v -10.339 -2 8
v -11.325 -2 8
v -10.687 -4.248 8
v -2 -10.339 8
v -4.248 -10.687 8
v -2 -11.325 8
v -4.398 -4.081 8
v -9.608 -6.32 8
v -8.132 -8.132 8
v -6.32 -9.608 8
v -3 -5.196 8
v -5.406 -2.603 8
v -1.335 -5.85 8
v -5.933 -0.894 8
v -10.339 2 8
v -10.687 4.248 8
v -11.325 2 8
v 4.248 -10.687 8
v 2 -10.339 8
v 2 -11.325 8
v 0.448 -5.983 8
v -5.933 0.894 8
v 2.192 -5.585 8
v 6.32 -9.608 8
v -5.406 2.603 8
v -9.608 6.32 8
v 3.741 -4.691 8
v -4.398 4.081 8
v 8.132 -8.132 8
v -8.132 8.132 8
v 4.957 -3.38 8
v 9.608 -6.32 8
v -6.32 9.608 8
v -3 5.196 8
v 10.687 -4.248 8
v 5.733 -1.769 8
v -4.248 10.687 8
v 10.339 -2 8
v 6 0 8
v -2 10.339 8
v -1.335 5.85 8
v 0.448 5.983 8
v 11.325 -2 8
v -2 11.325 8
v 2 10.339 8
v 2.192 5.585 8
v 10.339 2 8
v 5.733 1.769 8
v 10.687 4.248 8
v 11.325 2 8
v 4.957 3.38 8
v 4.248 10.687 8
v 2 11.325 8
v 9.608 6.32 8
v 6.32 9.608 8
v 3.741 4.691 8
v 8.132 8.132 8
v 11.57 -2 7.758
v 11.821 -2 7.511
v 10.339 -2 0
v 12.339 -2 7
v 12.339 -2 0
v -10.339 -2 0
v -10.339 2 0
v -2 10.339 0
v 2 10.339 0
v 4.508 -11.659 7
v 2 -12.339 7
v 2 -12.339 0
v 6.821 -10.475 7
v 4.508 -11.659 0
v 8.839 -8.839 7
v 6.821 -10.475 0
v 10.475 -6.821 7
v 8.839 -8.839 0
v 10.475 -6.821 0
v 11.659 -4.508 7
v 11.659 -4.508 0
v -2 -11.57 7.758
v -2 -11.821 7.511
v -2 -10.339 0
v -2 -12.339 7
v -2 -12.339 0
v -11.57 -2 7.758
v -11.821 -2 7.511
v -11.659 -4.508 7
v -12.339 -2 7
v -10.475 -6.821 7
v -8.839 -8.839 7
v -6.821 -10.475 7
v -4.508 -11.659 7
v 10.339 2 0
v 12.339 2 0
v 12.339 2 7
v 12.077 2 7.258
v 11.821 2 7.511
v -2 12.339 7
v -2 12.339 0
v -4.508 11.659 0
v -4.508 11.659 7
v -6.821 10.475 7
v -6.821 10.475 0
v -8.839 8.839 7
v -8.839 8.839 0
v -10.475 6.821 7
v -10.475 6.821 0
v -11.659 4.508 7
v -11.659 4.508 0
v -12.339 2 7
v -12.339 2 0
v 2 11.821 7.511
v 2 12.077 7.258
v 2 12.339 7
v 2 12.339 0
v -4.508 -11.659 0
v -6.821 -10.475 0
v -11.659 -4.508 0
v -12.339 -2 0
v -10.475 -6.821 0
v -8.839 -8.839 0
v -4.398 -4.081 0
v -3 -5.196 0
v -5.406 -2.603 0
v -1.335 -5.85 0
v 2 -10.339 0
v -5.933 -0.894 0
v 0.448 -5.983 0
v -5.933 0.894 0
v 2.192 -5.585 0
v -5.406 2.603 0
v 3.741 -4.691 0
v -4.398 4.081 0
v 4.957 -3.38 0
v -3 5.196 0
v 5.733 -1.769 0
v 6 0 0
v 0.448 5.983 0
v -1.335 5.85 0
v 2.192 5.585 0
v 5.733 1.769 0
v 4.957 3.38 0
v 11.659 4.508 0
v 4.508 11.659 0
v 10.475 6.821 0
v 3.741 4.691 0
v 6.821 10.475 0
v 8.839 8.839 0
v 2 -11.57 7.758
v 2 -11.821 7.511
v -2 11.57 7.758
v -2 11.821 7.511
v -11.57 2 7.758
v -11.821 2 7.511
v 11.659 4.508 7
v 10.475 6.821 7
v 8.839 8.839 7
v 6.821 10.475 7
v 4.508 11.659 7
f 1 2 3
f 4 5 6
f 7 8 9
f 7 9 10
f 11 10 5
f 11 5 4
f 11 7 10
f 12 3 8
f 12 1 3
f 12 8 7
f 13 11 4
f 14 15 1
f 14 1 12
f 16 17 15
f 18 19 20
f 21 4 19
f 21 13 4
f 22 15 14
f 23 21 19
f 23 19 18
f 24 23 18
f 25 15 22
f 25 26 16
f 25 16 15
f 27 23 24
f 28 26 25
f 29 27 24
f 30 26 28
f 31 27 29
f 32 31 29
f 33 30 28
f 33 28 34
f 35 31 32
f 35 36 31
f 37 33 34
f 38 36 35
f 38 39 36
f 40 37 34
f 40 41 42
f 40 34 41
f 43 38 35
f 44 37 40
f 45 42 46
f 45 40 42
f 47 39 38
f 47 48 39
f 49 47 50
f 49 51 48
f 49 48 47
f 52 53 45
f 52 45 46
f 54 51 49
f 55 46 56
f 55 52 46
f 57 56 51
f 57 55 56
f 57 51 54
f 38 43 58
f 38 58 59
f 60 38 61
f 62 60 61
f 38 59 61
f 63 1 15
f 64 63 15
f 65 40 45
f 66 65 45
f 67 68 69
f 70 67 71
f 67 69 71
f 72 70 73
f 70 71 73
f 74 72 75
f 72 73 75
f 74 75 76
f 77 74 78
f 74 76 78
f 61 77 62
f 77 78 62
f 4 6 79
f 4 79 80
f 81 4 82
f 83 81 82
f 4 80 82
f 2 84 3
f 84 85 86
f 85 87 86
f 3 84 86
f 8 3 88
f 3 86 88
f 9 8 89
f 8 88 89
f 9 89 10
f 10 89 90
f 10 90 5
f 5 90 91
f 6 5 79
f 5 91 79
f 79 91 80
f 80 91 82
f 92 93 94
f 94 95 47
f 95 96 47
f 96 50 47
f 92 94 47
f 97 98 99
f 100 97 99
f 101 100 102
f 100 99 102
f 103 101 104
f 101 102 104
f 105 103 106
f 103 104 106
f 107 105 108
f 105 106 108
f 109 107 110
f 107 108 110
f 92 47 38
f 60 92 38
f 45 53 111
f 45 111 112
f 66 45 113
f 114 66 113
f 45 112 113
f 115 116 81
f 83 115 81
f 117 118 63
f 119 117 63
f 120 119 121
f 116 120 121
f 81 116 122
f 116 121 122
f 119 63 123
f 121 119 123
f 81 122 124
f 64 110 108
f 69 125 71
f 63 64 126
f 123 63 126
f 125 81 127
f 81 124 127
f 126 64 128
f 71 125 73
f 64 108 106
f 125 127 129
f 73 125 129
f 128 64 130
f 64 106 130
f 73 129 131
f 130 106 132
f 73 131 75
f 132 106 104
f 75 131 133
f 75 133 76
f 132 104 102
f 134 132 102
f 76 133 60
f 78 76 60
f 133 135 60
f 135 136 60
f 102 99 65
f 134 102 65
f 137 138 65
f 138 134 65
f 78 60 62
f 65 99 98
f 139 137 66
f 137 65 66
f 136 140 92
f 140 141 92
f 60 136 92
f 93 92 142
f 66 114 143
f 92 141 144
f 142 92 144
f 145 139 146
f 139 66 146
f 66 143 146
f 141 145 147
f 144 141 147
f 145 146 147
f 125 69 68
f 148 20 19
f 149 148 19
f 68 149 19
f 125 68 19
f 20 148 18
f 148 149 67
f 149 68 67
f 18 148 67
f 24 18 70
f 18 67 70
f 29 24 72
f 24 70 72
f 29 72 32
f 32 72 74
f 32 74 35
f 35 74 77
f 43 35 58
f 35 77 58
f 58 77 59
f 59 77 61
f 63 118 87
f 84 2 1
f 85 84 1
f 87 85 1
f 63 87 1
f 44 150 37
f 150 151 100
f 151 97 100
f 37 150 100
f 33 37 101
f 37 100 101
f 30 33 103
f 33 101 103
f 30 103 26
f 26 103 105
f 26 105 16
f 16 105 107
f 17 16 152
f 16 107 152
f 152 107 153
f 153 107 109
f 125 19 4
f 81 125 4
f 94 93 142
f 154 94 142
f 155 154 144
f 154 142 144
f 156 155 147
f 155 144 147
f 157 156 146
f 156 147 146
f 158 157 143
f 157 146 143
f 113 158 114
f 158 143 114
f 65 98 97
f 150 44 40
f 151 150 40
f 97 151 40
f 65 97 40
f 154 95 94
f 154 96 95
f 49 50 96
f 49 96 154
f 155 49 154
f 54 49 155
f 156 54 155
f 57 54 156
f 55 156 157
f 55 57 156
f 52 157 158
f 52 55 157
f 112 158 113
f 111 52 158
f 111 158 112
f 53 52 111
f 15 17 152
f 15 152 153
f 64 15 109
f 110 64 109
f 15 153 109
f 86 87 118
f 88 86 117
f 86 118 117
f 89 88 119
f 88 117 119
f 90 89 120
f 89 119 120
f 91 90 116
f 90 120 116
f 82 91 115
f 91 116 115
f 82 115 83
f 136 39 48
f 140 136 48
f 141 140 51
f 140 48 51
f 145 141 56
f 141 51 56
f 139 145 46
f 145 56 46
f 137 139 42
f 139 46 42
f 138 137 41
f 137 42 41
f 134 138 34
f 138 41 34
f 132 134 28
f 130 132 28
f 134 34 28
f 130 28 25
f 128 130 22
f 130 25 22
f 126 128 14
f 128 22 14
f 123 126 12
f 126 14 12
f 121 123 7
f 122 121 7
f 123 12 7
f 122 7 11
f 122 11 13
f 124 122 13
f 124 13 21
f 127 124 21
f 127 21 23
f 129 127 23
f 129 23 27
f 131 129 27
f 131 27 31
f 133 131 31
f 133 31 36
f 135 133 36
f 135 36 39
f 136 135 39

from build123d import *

# Parameters (mm, degrees)
SKETCH1_R           = 12.5
BOSS_EXTRUDE1_DEPTH = 8
CUT_EXTRUDE1_DEPTH  = 20.403607912
SKETCH3_R           = 6
CUT_EXTRUDE2_DEPTH  = 20.19635382
CHAMFER1_SIZE       = 1


with BuildPart() as part:
    # Sketch1 → Boss-Extrude1 (new body)
    with BuildSketch(Plane.XY):
        Circle(SKETCH1_R)
    extrude(amount=BOSS_EXTRUDE1_DEPTH)

    # Sketch2 → Cut-Extrude1 (cut, through all)
    with BuildSketch(Plane.XY.offset(8)):
        with BuildLine():
            Line((-2, 12.338962679), (-2, 10.338962679))
            Line((-2, 10.338962679), (2, 10.338962679))
            Line((2, 10.338962679), (2, 12.338962679))
            ThreePointArc((2, 12.338962679), (0, 12.5), (-2, 12.338962679))
        make_face()
        with BuildLine():
            Line((12.338962679, 2), (10.338962679, 2))
            Line((10.338962679, 2), (10.338962679, -2))
            Line((10.338962679, -2), (12.338962679, -2))
            ThreePointArc((12.338962679, -2), (12.5, 0), (12.338962679, 2))
        make_face()
        with BuildLine():
            Line((2, -12.338962679), (2, -10.338962679))
            Line((2, -10.338962679), (-2, -10.338962679))
            Line((-2, -10.338962679), (-2, -12.338962679))
            ThreePointArc((-2, -12.338962679), (0, -12.5), (2, -12.338962679))
        make_face()
        with BuildLine():
            Line((-12.338962679, -2), (-10.338962679, -2))
            Line((-10.338962679, -2), (-10.338962679, 2))
            Line((-10.338962679, 2), (-12.338962679, 2))
            ThreePointArc((-12.338962679, 2), (-12.5, 0), (-12.338962679, -2))
        make_face()
    extrude(amount=-CUT_EXTRUDE1_DEPTH, mode=Mode.SUBTRACT)

    # Sketch3 → Cut-Extrude2 (cut, through all)
    with BuildSketch(Plane.XY.offset(8)):
        Circle(SKETCH3_R)
    extrude(amount=-CUT_EXTRUDE2_DEPTH, mode=Mode.SUBTRACT)

    # Chamfer1
    chamfer1_edges = [part.edges().sort_by_distance(p)[0] for p in [
        (-8.838834765, 8.838834765, 8),
        (-8.838834765, -8.838834765, 8),
        (8.838834765, -8.838834765, 8),
        (8.838834765, 8.838834765, 8),
    ]]
    chamfer(chamfer1_edges, length=CHAMFER1_SIZE)


solid = part.part
